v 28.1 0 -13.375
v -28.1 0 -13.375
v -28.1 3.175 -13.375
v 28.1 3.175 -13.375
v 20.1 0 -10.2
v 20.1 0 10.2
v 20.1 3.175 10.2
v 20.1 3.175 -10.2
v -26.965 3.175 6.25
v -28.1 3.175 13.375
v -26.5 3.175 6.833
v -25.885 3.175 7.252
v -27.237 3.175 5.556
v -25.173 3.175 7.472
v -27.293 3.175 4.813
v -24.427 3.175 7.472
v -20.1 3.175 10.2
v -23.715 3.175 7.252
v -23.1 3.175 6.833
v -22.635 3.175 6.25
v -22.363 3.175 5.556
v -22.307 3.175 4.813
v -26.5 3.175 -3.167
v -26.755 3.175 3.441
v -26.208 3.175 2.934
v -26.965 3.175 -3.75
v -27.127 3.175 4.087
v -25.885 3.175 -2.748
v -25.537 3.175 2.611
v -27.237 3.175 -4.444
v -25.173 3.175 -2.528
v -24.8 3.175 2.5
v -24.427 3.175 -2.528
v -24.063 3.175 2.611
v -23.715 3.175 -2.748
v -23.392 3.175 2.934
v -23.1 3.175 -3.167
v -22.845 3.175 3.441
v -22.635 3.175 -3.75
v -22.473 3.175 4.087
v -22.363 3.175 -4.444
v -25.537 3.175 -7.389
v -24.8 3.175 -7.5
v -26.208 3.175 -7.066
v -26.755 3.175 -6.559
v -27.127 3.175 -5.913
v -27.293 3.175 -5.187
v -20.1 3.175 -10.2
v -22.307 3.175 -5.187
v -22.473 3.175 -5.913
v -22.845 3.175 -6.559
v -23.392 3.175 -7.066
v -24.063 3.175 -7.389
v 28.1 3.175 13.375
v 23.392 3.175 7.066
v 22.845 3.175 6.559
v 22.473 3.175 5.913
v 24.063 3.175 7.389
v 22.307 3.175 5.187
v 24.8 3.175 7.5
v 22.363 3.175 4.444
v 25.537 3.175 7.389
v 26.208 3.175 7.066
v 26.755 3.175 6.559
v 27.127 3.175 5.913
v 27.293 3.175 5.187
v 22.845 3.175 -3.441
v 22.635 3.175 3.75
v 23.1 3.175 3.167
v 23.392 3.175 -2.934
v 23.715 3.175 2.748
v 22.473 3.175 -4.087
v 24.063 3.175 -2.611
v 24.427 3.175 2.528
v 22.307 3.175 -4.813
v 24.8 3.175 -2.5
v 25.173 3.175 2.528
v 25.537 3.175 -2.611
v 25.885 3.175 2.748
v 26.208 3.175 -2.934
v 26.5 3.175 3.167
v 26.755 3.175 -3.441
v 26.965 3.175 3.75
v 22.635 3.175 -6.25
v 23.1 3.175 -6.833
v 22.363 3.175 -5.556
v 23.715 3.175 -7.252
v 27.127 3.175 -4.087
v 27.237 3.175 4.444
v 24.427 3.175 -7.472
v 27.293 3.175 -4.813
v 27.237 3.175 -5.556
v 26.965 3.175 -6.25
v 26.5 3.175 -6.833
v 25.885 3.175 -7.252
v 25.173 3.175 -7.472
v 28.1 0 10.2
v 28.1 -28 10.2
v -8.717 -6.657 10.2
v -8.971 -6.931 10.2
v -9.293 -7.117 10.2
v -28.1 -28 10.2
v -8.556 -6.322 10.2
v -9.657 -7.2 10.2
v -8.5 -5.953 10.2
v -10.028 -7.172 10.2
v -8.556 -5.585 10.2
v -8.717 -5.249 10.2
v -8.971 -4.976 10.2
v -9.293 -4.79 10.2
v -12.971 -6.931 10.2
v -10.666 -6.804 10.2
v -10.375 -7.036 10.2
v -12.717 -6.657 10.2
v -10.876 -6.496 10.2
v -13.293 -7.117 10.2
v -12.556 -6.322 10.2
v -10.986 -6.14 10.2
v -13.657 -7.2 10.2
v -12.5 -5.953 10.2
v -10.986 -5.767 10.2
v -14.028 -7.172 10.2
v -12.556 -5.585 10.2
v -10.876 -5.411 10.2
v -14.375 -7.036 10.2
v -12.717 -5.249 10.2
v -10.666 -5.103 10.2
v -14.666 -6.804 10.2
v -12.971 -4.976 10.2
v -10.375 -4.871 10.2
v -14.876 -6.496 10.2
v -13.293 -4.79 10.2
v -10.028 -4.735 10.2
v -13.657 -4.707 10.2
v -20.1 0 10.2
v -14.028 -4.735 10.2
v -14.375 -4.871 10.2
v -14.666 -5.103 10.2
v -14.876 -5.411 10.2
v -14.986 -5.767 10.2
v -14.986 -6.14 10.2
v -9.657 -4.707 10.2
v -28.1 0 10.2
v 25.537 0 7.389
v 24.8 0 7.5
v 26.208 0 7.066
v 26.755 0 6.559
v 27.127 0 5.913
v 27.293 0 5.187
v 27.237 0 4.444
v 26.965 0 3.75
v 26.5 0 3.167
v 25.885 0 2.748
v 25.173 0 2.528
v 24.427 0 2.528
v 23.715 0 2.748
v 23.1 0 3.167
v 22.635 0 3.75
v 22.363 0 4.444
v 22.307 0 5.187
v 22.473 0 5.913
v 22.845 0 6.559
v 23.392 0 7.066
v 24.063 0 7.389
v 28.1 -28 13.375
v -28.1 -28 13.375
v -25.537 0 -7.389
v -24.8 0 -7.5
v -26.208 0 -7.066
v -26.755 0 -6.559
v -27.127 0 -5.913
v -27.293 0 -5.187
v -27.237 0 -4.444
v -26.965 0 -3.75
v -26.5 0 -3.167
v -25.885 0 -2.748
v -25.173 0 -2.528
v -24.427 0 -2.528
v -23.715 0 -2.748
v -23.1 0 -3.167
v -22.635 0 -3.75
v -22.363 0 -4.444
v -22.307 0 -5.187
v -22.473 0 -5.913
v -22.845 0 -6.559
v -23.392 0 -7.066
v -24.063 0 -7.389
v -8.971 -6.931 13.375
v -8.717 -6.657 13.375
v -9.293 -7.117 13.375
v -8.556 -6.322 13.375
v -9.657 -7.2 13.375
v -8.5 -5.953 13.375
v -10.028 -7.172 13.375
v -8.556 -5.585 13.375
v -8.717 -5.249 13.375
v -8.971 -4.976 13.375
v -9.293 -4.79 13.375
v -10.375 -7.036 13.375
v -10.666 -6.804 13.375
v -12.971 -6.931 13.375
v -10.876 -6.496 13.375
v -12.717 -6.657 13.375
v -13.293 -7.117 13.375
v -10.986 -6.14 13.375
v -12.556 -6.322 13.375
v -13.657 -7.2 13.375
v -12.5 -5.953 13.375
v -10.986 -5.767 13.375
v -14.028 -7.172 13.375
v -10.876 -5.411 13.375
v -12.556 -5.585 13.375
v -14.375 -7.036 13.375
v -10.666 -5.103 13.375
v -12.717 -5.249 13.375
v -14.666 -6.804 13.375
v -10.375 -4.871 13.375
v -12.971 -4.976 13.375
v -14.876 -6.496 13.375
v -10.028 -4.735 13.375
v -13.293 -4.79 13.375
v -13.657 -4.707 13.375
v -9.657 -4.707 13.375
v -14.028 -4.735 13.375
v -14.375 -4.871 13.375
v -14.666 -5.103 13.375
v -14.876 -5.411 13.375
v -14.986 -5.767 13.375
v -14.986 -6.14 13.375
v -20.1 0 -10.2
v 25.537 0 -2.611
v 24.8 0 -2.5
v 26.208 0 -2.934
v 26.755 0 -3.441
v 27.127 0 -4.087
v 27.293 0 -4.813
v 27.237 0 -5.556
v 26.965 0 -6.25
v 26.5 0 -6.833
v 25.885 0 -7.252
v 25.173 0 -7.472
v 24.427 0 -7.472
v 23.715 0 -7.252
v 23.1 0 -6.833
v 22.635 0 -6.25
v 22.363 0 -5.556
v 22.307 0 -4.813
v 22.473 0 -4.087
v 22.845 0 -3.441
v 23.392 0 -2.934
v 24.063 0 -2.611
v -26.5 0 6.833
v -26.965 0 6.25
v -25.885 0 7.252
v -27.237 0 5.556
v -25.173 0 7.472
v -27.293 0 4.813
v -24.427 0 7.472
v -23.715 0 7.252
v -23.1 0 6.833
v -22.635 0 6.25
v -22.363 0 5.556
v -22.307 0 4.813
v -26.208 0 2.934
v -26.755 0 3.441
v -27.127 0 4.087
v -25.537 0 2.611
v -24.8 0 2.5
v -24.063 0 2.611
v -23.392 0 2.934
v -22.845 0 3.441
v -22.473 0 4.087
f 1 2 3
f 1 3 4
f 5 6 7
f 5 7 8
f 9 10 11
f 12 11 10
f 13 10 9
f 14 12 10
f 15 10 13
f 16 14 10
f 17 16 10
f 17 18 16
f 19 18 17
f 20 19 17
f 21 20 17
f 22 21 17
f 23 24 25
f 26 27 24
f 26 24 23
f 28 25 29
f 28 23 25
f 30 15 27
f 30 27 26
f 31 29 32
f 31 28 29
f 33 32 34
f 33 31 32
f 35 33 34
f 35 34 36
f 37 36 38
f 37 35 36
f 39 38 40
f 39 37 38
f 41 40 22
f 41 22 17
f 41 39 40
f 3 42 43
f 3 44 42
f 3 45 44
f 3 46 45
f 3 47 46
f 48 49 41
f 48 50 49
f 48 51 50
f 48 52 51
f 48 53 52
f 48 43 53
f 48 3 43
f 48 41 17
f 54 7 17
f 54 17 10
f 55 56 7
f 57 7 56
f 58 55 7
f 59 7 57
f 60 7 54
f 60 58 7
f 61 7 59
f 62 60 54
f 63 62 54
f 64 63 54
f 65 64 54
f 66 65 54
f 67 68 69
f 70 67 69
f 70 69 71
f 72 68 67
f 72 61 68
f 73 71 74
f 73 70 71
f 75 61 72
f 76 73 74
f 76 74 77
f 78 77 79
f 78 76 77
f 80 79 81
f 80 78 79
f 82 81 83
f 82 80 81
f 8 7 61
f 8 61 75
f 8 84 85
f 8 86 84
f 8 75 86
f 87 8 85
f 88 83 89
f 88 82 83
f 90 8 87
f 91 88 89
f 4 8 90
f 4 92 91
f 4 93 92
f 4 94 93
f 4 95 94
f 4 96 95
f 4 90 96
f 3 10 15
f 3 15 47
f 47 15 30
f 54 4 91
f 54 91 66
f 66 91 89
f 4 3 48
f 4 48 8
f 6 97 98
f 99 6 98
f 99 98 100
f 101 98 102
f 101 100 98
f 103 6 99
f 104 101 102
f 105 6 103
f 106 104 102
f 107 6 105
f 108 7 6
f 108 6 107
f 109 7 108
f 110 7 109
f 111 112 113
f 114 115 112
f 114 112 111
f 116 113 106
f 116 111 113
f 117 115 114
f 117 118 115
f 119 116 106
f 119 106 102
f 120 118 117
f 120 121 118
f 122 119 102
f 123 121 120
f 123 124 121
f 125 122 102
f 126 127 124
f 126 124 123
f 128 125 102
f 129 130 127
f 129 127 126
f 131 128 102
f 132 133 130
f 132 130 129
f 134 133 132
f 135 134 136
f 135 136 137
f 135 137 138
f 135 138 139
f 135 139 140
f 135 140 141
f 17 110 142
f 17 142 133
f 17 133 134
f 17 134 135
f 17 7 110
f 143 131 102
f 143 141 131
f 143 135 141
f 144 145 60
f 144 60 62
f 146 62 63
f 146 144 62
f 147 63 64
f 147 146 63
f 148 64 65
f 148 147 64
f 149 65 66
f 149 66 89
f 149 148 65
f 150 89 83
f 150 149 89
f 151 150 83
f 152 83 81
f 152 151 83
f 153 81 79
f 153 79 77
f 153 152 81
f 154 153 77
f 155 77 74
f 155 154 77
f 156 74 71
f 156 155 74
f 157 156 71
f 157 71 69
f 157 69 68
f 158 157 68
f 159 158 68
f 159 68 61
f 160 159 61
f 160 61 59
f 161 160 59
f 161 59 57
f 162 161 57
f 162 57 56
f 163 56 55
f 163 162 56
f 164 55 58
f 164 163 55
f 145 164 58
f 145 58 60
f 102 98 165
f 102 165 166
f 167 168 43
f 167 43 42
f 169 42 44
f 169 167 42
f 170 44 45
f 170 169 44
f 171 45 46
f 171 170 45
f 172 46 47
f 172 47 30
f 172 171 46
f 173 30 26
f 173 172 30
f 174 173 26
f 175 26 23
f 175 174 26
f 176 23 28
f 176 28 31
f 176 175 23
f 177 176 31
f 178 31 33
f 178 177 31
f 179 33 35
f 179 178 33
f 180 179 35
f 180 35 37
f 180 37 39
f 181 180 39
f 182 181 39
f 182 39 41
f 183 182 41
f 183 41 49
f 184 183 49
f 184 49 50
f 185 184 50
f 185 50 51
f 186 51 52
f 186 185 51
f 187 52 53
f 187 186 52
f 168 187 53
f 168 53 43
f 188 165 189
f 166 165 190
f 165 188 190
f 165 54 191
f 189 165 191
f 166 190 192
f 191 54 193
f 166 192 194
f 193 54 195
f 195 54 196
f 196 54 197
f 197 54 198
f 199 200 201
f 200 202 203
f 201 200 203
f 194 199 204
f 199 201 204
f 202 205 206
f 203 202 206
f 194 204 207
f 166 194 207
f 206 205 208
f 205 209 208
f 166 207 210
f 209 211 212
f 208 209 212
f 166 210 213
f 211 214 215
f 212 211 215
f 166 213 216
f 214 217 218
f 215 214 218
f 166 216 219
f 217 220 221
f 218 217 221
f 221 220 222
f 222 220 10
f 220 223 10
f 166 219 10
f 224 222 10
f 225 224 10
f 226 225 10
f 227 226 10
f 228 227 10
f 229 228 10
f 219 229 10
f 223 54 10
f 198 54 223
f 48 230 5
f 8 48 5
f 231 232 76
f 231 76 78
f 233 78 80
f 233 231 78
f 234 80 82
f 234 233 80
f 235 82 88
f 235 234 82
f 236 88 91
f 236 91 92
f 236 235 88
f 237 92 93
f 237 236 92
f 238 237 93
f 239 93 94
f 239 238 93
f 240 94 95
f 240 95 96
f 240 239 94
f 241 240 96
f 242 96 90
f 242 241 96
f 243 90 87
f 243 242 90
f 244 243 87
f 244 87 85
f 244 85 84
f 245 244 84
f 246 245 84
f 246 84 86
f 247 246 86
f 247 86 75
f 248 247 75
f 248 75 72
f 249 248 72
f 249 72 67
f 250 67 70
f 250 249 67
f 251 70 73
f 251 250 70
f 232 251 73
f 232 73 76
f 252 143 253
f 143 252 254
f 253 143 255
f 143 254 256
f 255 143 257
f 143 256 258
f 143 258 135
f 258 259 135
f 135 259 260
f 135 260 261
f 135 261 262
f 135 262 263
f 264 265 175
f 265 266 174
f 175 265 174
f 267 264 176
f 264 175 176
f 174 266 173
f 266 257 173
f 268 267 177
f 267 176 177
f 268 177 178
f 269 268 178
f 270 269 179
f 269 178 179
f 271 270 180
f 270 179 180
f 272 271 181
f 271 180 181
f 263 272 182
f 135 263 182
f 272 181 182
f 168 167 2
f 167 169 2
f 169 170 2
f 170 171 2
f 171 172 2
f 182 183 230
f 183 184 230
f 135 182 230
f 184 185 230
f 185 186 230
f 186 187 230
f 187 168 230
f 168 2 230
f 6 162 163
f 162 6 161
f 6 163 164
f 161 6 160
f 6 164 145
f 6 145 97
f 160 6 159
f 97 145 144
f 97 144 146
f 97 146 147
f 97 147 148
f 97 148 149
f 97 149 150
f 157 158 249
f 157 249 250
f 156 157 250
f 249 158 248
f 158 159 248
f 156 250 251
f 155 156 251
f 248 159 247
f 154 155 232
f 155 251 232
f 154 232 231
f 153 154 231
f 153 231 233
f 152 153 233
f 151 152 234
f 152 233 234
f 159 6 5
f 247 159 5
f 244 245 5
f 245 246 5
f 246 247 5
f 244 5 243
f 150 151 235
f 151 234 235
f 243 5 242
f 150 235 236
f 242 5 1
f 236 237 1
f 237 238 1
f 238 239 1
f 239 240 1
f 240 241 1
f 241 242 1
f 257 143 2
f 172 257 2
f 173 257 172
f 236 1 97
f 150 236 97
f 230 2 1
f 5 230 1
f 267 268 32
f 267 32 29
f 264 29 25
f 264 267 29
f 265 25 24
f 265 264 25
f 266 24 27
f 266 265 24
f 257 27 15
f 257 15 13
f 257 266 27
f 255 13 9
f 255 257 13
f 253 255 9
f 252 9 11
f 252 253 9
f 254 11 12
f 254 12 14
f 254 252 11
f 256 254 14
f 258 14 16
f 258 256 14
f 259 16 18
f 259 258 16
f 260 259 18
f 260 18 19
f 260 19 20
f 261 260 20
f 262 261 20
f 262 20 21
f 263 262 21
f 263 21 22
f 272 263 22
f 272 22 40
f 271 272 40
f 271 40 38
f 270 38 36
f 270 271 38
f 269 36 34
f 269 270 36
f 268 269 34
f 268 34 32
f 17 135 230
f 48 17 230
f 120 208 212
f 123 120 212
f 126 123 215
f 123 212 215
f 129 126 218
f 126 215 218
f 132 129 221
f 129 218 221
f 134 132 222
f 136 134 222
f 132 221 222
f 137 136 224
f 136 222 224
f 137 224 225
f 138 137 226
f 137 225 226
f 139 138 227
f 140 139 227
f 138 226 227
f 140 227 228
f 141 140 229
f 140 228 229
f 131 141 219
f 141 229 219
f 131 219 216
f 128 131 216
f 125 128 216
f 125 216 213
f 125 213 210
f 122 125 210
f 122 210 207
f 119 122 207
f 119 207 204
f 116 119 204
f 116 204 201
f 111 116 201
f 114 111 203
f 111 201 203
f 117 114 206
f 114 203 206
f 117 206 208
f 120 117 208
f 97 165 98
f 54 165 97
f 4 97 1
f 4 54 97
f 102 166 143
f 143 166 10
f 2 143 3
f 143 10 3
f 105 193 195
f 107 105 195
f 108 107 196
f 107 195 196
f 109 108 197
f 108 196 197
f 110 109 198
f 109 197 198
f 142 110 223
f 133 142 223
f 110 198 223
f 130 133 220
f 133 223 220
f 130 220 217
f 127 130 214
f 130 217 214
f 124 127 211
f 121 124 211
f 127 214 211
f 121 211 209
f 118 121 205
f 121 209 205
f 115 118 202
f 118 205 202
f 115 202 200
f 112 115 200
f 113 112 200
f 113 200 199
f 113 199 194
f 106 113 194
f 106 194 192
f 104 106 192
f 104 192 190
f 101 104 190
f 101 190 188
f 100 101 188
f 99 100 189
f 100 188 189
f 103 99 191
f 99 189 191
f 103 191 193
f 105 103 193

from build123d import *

# Parameters (mm, degrees)
SKETCH1_W           = 56.2
SKETCH1_H           = 26.75
SKETCH1_R           = 2.5
SKETCH1_W_2         = 40.2
SKETCH1_H_2         = 20.4
BOSS_EXTRUDE1_DEPTH = 3.175
SKETCH2_W           = 56.2
SKETCH2_H           = 3.175
BOSS_EXTRUDE2_DEPTH = 28
SKETCH3_R           = 1.25
CUT_EXTRUDE1_DEPTH  = 3.175


with BuildPart() as part:
    # Sketch1 → Boss-Extrude1 (new body)
    with BuildSketch(Plane(origin=(0, 0, 0), x_dir=(1, 0, 0), z_dir=(0, 1, 0))):
        Rectangle(SKETCH1_W, SKETCH1_H)
        with Locations(Location((24.8, 5, 0), (0, 0, 270))):
            Circle(SKETCH1_R, mode=Mode.SUBTRACT)
        with Locations(Location((24.8, -5, 0), (0, 0, 270))):
            Circle(SKETCH1_R, mode=Mode.SUBTRACT)
        with Locations(Location((-24.8, -5, 0), (0, 0, 90))):
            Circle(SKETCH1_R, mode=Mode.SUBTRACT)
        with Locations(Location((-24.8, 5, 0), (0, 0, 90))):
            Circle(SKETCH1_R, mode=Mode.SUBTRACT)
        Rectangle(SKETCH1_W_2, SKETCH1_H_2, mode=Mode.SUBTRACT)
    extrude(amount=BOSS_EXTRUDE1_DEPTH)

    # Sketch2 → Boss-Extrude2 (add)
    with BuildSketch(Plane(origin=(0, 0, 0), x_dir=(-1, 0, 0), z_dir=(0, -1, 0))):
        with Locations((0, -11.7875)):
            Rectangle(SKETCH2_W, SKETCH2_H)
    extrude(amount=BOSS_EXTRUDE2_DEPTH)

    # Sketch3 → Cut-Extrude1 (cut)
    with BuildSketch(Plane.XY.offset(13.375)):
        with Locations((-9.75, -5.953329294)):
            Circle(SKETCH3_R)
        with Locations((-13.75, -5.953329294)):
            Circle(SKETCH3_R)
    extrude(amount=-CUT_EXTRUDE1_DEPTH, mode=Mode.SUBTRACT)


solid = part.part
